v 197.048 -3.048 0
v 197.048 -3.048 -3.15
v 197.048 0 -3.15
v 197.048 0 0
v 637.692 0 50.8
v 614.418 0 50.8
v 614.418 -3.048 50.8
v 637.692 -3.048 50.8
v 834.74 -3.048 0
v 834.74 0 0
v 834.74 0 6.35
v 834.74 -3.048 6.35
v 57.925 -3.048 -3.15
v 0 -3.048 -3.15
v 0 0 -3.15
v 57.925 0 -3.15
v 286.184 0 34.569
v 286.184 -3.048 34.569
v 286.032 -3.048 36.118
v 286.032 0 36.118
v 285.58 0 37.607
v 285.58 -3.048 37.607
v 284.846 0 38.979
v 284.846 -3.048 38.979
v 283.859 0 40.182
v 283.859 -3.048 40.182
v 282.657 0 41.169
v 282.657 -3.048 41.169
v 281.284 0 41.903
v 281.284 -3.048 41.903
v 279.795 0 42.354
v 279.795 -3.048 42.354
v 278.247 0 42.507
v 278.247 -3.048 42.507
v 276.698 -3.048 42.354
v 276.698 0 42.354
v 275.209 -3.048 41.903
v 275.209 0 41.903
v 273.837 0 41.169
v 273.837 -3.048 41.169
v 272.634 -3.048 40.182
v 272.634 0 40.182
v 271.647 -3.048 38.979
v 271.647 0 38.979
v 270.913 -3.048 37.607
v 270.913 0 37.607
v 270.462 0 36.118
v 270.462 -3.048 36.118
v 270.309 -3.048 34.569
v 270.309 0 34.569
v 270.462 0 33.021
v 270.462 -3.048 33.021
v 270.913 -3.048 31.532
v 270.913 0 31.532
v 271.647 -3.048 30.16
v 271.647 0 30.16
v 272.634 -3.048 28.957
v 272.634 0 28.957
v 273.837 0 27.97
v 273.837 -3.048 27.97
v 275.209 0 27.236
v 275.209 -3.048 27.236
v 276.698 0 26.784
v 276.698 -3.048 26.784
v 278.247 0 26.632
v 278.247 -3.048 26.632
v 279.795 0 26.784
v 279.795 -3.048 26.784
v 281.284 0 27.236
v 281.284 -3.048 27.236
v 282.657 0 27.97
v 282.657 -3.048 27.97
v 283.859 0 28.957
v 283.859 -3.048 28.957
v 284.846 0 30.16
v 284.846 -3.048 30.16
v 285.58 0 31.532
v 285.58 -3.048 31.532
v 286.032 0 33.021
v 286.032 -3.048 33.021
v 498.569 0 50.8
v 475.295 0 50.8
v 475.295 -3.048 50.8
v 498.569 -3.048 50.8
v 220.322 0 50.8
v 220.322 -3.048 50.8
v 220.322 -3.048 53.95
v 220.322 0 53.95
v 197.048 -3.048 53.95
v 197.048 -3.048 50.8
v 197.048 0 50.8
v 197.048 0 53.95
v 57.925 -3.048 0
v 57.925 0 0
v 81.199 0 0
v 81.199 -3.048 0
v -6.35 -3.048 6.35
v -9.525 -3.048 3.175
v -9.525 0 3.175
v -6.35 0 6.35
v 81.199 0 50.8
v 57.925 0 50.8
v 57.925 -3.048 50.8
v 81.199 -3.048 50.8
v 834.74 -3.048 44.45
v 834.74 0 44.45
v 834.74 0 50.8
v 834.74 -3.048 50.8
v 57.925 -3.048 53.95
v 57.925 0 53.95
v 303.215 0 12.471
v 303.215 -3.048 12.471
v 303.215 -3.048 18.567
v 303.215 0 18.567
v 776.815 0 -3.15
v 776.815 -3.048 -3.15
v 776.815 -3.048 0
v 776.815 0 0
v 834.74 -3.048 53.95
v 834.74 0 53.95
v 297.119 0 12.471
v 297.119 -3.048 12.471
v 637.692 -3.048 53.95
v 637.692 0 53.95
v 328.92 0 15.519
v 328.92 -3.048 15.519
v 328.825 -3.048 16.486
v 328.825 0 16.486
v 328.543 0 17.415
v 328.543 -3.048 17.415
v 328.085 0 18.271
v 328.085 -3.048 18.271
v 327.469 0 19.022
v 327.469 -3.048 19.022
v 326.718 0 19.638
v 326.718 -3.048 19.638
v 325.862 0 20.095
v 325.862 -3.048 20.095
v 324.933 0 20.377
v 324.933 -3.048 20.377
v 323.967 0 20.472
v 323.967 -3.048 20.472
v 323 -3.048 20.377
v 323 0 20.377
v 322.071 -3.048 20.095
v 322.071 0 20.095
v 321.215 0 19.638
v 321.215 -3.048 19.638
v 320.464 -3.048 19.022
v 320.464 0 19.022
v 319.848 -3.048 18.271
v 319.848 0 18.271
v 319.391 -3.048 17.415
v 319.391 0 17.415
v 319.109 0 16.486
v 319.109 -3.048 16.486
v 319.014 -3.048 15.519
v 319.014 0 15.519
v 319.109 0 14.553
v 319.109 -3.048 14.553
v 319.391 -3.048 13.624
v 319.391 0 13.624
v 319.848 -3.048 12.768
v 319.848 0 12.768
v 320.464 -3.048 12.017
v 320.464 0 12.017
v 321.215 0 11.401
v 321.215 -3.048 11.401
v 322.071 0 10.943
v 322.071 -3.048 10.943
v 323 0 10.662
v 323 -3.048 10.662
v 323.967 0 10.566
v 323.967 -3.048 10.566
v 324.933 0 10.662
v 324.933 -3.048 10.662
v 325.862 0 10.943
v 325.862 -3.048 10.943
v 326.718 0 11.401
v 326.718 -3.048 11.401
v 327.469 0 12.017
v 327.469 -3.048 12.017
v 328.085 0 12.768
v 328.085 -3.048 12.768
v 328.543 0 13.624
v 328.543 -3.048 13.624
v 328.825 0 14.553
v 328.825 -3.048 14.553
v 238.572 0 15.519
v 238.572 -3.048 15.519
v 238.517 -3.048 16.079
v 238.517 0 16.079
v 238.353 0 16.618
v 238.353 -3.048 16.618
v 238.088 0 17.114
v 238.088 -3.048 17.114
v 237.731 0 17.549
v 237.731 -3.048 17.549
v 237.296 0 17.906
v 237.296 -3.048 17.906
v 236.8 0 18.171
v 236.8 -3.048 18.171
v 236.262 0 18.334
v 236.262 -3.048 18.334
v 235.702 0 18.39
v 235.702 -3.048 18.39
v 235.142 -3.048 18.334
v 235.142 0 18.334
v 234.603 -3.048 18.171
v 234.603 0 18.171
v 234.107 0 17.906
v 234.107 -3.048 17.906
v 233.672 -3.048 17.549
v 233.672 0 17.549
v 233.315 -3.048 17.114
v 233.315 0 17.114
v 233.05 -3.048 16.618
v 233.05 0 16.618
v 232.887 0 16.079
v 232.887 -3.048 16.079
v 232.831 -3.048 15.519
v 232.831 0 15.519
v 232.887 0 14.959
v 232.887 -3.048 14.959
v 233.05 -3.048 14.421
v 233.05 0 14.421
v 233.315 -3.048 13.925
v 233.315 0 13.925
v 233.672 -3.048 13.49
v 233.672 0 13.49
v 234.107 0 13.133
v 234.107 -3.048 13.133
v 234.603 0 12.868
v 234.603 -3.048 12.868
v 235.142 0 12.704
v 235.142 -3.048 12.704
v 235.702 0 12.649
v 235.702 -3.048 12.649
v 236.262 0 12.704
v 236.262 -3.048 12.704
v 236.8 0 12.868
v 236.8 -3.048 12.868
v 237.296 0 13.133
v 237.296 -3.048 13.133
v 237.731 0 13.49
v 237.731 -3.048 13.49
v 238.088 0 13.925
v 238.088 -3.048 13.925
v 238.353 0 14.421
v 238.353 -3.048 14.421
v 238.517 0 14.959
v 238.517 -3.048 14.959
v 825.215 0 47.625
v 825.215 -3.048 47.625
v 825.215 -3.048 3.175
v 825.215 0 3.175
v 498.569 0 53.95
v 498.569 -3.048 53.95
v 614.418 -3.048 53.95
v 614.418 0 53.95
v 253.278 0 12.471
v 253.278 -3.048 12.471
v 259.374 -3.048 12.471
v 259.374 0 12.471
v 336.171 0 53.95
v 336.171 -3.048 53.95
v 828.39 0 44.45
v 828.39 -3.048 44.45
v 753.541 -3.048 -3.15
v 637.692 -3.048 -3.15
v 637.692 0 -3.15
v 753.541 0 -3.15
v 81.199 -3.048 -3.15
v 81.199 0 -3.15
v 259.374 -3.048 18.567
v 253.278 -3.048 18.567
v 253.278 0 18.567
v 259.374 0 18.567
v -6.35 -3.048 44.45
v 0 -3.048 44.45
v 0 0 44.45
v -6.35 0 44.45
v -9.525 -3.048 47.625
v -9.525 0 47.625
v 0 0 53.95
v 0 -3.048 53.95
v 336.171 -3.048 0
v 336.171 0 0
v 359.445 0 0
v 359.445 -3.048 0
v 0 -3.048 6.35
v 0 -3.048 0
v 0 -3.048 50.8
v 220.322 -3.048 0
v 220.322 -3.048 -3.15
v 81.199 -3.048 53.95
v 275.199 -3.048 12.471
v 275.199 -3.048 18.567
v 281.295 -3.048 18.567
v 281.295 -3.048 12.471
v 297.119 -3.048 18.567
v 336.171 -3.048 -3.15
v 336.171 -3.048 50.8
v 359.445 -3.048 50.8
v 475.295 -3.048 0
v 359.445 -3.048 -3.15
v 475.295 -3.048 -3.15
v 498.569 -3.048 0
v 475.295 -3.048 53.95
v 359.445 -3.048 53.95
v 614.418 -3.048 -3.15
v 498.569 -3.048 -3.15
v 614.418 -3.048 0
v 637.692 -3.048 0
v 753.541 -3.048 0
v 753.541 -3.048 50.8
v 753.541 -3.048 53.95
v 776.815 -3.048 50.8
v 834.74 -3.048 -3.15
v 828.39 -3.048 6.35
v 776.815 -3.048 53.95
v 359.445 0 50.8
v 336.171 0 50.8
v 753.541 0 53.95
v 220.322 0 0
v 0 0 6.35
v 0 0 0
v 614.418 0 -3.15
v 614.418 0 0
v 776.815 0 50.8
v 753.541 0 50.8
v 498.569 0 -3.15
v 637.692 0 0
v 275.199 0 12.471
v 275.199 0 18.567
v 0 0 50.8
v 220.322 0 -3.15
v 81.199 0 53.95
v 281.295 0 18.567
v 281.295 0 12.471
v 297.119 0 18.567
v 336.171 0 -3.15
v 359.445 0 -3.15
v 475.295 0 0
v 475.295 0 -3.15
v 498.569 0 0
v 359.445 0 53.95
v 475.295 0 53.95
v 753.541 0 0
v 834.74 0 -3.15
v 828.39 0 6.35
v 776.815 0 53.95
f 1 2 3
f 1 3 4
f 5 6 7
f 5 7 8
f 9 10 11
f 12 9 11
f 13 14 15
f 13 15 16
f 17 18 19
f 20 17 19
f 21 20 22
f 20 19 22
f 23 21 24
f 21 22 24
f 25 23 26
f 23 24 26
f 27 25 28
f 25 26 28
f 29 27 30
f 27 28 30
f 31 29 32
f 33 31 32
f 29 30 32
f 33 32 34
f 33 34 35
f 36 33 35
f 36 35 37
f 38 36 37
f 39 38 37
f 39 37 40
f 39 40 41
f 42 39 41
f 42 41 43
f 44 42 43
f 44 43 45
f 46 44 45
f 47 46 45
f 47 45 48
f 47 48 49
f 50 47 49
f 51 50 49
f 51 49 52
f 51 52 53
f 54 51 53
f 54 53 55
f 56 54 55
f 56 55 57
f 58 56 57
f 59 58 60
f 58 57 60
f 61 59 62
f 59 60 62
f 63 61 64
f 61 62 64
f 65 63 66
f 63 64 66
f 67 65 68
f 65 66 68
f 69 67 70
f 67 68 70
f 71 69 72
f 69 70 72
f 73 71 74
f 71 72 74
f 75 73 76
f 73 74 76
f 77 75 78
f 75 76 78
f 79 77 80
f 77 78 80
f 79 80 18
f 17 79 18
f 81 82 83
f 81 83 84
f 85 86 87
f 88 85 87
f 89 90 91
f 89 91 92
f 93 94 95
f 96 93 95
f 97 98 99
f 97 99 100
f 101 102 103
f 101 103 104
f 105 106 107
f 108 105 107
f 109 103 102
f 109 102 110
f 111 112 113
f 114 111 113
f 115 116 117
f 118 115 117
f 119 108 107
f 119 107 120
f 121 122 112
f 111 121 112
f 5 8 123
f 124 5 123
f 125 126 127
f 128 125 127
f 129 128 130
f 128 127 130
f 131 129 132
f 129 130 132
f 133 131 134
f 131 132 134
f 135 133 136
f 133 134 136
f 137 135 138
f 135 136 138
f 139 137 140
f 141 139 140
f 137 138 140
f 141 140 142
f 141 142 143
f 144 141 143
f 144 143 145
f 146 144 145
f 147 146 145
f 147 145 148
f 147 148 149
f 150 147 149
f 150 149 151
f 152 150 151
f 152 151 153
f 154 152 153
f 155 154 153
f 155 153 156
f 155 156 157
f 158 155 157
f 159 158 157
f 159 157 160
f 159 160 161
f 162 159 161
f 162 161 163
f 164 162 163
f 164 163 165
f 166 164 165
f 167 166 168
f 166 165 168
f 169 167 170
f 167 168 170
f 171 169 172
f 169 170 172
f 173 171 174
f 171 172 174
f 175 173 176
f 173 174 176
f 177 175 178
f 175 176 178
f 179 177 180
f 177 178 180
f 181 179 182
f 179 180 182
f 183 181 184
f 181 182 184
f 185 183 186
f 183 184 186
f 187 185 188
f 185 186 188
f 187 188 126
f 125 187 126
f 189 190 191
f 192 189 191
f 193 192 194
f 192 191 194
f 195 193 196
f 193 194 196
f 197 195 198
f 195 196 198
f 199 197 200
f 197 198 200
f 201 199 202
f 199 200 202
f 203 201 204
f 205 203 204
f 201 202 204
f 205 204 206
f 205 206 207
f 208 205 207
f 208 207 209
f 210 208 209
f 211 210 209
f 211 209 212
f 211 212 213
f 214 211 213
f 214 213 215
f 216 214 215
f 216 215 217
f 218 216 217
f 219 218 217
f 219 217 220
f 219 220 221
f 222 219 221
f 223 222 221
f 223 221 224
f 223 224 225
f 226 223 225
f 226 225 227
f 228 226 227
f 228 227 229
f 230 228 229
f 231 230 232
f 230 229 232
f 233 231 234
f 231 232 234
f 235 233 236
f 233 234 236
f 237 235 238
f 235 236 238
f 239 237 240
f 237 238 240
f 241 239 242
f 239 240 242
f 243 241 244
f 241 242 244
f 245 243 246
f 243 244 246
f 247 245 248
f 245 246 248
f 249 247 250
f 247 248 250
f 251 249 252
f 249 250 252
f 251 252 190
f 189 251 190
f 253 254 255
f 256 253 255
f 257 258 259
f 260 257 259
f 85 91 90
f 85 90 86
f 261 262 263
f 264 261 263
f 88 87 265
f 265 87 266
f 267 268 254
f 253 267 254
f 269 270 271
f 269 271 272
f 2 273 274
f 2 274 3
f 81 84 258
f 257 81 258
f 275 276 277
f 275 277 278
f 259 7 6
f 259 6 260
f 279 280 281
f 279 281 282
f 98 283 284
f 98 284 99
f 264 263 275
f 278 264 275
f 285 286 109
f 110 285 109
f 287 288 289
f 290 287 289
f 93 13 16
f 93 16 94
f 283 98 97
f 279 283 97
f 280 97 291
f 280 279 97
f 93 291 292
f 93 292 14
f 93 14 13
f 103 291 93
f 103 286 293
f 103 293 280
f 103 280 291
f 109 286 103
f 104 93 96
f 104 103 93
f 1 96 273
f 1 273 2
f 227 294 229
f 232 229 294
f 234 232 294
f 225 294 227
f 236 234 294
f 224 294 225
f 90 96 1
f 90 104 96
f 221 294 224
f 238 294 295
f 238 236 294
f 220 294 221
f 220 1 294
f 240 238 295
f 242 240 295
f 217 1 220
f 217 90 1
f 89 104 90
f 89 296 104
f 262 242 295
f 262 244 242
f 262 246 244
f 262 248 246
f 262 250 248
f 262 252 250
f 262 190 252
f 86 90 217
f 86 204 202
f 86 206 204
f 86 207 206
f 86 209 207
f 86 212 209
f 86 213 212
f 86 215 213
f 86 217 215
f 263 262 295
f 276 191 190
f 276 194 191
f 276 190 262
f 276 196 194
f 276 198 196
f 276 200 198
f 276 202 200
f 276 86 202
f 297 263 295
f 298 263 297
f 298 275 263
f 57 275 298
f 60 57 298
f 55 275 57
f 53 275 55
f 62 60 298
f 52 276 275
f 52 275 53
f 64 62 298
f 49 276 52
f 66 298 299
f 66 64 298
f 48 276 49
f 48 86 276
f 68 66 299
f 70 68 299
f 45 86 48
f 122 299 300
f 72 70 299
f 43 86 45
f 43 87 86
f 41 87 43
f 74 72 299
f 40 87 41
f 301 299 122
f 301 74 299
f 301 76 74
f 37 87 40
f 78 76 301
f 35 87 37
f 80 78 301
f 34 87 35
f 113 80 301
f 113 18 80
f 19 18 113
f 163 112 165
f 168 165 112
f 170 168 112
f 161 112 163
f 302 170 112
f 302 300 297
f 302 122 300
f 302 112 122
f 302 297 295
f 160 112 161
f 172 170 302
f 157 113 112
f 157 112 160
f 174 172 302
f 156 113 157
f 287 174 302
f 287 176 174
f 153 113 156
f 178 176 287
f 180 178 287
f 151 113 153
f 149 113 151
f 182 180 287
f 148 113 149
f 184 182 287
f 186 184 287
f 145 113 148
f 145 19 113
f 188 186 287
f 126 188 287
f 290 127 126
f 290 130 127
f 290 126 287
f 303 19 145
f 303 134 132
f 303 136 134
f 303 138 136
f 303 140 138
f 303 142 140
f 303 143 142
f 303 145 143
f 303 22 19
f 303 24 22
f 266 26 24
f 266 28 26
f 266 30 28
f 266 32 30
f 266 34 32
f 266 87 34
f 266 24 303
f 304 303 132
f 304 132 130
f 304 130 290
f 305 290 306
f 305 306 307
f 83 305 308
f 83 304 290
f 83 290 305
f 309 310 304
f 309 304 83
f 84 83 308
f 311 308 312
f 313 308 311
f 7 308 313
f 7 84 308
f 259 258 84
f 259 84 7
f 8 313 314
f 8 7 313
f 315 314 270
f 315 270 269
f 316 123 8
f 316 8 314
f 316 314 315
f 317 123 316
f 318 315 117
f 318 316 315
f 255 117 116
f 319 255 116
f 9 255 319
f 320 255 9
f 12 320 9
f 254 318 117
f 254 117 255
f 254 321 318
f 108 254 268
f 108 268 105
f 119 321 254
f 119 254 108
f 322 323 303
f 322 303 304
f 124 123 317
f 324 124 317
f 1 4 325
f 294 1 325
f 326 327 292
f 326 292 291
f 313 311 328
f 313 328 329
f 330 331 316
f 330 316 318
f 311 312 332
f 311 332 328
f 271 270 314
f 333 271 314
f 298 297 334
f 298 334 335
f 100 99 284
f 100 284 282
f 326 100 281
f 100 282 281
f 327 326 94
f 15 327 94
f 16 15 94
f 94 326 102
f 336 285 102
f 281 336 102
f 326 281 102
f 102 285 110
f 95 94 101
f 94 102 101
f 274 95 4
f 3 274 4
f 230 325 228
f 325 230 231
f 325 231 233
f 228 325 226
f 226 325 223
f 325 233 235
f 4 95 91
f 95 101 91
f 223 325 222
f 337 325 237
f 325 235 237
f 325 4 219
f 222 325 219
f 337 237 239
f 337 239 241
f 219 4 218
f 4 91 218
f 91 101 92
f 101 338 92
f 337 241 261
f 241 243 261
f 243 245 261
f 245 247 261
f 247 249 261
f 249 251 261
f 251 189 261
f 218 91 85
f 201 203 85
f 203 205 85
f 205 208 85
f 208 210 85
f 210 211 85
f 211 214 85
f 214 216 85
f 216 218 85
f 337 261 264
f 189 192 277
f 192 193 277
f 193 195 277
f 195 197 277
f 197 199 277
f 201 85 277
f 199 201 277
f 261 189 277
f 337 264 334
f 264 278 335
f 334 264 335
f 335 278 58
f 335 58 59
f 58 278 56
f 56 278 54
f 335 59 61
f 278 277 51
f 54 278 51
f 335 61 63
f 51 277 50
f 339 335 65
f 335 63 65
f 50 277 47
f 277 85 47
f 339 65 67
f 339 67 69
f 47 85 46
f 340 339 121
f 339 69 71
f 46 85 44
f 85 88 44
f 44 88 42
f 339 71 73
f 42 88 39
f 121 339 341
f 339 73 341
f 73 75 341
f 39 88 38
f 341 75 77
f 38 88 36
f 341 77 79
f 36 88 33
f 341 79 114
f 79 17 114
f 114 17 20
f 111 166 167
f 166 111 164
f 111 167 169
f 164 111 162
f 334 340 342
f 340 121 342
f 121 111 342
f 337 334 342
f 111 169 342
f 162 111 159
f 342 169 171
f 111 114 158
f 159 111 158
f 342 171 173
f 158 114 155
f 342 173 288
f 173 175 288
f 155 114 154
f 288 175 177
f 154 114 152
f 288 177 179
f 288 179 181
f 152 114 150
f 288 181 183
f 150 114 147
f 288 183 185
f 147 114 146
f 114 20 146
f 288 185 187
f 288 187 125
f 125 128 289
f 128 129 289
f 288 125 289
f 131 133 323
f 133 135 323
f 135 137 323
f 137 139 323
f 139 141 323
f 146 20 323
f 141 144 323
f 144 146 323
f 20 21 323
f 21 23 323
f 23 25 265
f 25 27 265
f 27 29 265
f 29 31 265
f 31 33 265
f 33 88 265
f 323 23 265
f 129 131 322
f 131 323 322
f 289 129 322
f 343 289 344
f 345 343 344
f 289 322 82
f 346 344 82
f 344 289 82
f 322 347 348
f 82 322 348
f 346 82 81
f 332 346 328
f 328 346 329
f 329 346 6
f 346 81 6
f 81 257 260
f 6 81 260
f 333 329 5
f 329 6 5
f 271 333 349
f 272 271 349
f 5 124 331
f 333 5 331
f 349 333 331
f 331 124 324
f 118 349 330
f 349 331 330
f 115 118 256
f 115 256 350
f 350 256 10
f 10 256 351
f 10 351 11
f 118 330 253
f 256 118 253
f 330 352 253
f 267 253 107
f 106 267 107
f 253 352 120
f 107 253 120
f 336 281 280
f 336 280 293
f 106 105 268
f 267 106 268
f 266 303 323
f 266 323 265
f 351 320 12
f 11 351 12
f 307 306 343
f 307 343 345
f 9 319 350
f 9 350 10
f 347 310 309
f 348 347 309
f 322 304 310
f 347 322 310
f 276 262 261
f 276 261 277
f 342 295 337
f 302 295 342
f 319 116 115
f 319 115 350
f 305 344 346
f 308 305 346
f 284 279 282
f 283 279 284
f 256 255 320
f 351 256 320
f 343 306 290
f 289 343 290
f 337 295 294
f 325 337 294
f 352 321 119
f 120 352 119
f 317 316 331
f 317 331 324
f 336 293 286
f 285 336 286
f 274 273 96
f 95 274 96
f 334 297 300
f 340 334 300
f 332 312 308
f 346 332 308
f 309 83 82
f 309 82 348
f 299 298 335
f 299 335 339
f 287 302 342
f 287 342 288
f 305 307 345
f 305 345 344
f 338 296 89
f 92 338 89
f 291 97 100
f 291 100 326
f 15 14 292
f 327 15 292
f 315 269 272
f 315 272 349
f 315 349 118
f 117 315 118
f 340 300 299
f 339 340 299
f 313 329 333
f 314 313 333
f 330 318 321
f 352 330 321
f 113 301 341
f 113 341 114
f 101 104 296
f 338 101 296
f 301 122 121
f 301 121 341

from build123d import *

# Parameters (mm, degrees)
F0_W     = 834.740075
F0_H     = 50.8
F1_DEPTH = 3.048
F3_W     = 57.9247
F3_H     = 3.1496
F3_W_2   = 115.8494
F4_DEPTH = 3.048
F6_DEPTH = 3.048
F7_DEPTH = 3.049
F8_W     = 6.096
F8_H     = 6.096
F8_R     = 2.8702
F8_R_2   = 4.953
F8_R_3   = 7.9375
F9_DEPTH = 3.049


with BuildPart() as f1:
    # F0 (on Front) → F1 (new body)
    with BuildSketch(Plane.XZ):
        with Locations((417.370037, 25.4)):
            Rectangle(F0_W, F0_H)
    extrude(amount=F1_DEPTH)

    # F3 (on face) → F4 (join)
    with BuildSketch(Plane.XZ.offset(3.048)):
        with Locations((28.96235, 52.3748)):
            Rectangle(F3_W, F3_H)
        with Locations((139.123346, 52.3748)):
            Rectangle(F3_W_2, F3_H)
        with Locations((28.96235, -1.5748)):
            Rectangle(F3_W, F3_H)
        with Locations((139.123346, -1.5748)):
            Rectangle(F3_W_2, F3_H)
        with Locations((278.246692, 52.3748)):
            Rectangle(F3_W_2, F3_H)
        with Locations((278.246692, -1.5748)):
            Rectangle(F3_W_2, F3_H)
        with Locations((417.370038, 52.3748)):
            Rectangle(F3_W_2, F3_H)
        with Locations((417.370038, -1.5748)):
            Rectangle(F3_W_2, F3_H)
        with Locations((556.493384, 52.3748)):
            Rectangle(F3_W_2, F3_H)
        with Locations((556.493384, -1.5748)):
            Rectangle(F3_W_2, F3_H)
        with Locations((695.61673, 52.3748)):
            Rectangle(F3_W_2, F3_H)
        with Locations((695.61673, -1.5748)):
            Rectangle(F3_W_2, F3_H)
        with Locations((805.777725, 52.3748)):
            Rectangle(F3_W, F3_H)
        with Locations((805.777725, -1.5748)):
            Rectangle(F3_W, F3_H)
    extrude(amount=-F4_DEPTH)

    # F5 (on face) → F6 (join)
    with BuildSketch(Plane.XZ.offset(3.048)):
        Polygon((-6.35, 6.35), (0, 6.35), (0, 44.45), (-6.35, 44.45), (-9.525, 47.625), (-9.525, 3.175), align=None)
    extrude(amount=-F6_DEPTH)

    # F5 (on face) → F7 (cut, through all)
    with BuildSketch(Plane.XZ.offset(3.048)):
        Polygon((828.390075, 6.35), (834.740075, 6.35), (834.740075, 44.45), (828.390075, 44.45), (825.215075, 47.625), (825.215075, 3.175), align=None)
    extrude(amount=-F7_DEPTH, mode=Mode.SUBTRACT)

    # F8 (on face) → F9 (cut, through all)
    with BuildSketch(Plane.XZ.offset(3.048)):
        with Locations((256.326492, 15.5194)):
            Rectangle(F8_W, F8_H)
        with Locations((278.246692, 15.5194)):
            Rectangle(F8_W, F8_H)
        with Locations((300.166892, 15.5194)):
            Rectangle(F8_W, F8_H)
        with Locations((235.701692, 15.5194)):
            Circle(F8_R)
        with Locations((323.966692, 15.5194)):
            Circle(F8_R_2)
        with Locations((278.246692, 34.5694)):
            Circle(F8_R_3)
    extrude(amount=-F9_DEPTH, mode=Mode.SUBTRACT)


solid = f1.part
